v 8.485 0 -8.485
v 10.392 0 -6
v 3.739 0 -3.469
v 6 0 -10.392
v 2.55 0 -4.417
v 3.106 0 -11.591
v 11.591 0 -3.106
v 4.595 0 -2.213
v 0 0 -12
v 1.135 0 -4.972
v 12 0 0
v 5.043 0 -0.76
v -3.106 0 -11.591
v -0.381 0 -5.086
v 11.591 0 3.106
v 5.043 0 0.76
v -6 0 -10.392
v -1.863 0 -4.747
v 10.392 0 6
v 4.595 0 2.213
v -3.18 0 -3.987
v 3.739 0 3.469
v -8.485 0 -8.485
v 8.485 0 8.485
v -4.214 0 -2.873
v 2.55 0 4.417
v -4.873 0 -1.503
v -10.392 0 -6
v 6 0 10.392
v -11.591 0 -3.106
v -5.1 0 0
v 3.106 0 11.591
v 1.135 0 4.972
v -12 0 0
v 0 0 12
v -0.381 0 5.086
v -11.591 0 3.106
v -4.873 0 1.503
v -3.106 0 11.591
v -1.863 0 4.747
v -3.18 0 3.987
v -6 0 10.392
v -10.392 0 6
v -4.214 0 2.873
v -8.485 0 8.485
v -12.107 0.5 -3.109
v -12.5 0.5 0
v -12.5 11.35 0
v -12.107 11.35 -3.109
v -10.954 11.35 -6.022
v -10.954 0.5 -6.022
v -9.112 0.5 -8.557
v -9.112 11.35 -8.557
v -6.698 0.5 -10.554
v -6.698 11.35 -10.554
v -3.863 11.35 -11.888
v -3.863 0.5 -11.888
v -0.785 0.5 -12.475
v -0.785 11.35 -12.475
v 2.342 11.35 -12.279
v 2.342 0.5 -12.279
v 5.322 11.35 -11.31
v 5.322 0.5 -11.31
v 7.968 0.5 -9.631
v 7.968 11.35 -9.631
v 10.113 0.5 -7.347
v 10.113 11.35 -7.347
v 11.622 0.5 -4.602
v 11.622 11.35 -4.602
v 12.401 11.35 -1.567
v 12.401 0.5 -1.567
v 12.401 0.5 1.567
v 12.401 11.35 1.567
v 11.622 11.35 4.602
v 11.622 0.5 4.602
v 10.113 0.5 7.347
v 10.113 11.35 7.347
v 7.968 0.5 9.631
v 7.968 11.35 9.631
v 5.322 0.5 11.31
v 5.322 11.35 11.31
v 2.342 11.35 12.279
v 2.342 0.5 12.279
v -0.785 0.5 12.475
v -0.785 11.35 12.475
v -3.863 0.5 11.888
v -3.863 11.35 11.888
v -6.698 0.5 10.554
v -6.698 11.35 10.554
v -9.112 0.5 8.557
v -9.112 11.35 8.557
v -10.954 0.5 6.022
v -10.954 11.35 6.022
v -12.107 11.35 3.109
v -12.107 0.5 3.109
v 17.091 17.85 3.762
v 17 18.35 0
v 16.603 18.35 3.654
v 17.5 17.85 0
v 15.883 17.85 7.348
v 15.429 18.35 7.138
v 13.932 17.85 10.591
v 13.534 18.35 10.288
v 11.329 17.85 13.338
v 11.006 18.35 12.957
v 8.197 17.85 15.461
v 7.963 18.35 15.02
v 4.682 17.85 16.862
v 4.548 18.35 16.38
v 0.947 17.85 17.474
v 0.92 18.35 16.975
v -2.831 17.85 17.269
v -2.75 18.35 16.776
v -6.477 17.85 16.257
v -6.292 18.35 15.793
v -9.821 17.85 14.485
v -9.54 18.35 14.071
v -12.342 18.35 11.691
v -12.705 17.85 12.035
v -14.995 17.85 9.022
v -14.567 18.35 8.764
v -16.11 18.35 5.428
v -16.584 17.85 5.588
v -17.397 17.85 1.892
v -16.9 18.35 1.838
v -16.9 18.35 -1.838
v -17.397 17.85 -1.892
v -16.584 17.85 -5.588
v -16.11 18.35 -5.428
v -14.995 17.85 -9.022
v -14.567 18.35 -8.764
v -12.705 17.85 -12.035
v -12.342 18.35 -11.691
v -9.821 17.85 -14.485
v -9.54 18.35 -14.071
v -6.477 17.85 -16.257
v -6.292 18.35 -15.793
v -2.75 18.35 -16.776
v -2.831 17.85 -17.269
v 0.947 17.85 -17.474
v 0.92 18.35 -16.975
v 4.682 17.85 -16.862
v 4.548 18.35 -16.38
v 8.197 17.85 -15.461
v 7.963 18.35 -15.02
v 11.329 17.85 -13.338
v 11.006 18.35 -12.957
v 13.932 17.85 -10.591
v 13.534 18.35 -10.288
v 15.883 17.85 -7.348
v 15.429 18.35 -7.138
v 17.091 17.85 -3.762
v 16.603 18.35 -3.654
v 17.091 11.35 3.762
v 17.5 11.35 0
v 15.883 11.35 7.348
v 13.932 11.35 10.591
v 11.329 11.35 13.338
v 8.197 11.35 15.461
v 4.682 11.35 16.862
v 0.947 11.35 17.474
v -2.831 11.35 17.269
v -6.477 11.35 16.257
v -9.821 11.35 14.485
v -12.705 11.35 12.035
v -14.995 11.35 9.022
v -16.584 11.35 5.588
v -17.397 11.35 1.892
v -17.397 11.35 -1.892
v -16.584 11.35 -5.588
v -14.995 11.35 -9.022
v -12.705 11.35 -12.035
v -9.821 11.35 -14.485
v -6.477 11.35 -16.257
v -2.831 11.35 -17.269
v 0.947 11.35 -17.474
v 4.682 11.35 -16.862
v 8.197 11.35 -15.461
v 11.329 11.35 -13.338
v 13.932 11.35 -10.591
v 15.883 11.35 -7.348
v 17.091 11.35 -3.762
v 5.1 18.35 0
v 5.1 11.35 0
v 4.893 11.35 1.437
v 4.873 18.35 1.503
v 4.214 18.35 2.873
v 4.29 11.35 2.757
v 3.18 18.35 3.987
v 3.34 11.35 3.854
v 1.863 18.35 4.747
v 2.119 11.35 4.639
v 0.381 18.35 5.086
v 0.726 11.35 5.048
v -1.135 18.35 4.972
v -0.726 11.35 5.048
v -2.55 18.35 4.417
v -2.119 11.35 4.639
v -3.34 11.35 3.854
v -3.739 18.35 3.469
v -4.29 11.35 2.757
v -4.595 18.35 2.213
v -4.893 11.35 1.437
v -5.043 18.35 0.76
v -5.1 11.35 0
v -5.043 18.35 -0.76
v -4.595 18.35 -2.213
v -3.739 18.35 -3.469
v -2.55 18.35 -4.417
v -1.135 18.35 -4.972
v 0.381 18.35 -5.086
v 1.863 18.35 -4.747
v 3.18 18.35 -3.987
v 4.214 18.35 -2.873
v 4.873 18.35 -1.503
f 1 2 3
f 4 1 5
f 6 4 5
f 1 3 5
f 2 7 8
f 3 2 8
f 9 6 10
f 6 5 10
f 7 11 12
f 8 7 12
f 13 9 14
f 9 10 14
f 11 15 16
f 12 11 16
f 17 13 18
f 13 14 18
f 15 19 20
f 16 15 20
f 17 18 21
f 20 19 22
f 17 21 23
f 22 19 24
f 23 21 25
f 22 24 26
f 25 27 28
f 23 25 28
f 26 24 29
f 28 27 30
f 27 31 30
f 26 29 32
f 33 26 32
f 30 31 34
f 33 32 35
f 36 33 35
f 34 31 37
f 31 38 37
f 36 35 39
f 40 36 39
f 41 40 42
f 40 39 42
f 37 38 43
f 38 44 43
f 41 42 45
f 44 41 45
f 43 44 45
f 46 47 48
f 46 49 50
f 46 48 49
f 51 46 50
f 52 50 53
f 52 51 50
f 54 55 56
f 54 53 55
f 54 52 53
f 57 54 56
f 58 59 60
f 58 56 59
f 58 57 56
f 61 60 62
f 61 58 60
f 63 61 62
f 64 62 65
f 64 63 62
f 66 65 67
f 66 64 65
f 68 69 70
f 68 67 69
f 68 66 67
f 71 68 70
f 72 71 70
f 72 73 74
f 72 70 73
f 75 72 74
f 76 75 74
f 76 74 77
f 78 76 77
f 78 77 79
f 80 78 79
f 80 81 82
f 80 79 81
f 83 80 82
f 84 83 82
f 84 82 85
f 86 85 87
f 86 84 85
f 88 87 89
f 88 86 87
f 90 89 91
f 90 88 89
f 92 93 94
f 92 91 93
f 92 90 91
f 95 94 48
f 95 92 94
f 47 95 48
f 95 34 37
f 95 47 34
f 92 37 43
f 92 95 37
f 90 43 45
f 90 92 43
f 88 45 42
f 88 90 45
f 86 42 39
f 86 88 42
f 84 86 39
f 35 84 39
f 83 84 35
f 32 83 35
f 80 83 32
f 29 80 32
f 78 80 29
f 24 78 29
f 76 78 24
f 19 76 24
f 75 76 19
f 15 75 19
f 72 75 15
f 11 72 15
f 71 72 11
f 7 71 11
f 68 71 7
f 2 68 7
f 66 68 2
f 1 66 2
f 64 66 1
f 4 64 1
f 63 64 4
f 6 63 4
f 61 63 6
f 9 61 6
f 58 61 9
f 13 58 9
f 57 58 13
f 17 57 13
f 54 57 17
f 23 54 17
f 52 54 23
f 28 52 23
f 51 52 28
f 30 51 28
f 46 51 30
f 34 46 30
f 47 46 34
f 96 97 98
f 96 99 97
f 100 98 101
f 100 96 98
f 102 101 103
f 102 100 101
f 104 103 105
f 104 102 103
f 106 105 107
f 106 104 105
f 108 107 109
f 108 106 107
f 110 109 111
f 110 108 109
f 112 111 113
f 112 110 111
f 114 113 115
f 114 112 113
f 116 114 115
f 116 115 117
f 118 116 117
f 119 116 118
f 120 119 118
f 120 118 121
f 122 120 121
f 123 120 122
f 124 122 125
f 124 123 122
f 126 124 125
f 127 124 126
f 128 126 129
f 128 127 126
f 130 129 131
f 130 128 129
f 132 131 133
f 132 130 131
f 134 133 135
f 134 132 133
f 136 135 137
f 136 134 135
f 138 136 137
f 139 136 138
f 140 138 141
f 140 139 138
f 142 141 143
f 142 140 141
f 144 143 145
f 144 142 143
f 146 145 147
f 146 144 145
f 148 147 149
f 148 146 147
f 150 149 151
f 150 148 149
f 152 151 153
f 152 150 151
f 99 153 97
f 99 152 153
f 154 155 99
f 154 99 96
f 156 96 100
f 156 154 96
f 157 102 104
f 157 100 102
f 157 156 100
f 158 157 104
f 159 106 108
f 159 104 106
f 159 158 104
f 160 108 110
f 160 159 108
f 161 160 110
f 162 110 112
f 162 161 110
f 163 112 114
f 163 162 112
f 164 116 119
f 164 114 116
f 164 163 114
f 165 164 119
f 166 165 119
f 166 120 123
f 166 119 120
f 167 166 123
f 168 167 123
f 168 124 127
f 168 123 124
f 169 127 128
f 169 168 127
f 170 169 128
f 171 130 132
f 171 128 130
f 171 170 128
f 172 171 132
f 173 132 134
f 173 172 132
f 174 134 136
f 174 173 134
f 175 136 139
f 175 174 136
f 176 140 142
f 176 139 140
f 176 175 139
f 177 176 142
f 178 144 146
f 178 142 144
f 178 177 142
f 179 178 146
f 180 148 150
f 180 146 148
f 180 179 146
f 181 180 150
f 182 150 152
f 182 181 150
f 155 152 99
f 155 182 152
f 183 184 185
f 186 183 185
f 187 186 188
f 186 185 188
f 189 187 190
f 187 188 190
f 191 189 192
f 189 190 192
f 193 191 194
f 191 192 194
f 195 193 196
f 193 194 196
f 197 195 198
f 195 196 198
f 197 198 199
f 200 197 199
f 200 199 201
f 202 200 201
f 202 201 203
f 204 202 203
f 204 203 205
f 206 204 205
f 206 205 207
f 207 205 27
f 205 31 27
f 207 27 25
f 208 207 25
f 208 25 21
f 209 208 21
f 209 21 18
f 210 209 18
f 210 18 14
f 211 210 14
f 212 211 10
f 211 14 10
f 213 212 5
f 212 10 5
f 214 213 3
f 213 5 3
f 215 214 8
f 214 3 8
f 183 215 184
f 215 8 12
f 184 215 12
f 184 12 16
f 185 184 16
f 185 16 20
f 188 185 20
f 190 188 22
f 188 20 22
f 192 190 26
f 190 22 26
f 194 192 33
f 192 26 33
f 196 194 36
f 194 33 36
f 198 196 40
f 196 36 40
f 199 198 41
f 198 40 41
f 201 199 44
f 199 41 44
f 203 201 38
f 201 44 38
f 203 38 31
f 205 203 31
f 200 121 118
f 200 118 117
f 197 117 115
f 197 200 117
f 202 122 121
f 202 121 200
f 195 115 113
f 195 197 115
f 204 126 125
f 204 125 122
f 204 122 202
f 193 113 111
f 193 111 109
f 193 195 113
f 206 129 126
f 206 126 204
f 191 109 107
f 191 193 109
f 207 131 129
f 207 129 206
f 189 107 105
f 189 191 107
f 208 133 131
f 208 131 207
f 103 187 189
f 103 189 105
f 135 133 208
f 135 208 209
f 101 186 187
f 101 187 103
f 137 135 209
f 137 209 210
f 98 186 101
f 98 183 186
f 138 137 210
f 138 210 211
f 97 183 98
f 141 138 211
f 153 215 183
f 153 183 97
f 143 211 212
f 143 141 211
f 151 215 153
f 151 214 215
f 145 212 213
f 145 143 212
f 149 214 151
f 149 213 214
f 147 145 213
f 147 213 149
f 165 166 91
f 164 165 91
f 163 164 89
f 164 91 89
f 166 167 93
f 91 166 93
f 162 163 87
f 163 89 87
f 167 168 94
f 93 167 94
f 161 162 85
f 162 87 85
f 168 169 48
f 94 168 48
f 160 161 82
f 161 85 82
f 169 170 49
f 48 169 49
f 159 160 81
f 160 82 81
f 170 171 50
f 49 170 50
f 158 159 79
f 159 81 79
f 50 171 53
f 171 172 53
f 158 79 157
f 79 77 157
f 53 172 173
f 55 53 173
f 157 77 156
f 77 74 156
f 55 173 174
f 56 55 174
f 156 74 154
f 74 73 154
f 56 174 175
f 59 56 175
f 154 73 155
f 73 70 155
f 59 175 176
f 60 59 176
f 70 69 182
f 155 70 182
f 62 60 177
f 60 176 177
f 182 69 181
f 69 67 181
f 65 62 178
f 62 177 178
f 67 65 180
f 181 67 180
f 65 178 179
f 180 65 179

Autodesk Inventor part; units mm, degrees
ref_plane "YZ Plane" through (0, 0, 0) normal (1, 0, 0) x (0, 1, 0)
ref_plane "XZ Plane" through (0, 0, 0) normal (0, 1, 0) x (-1, 0, 0)
ref_plane "XY Plane" through (0, 0, 0) normal (0, 0, 1) x (1, 0, 0)
sketch "Sketch1" plane through (0, 0, 0) normal (0, 1, 0) x (-1, 0, 0)
  circle A0 centre (0, 0) radius 5.1
  circle A1 centre (0, 0) radius 12.5
  dimension "d0" = 10.2
  dimension "d1" = 25
extrude "Extrusion1" add sketch "Sketch1" along normal blind 11.35
sketch "Sketch2" plane through (0, 11.35, 0) normal (0, 1, 0) x (1, 0, 0)
  circle A0 centre (0, 0) radius 12.5 projected
  circle A1 centre (0, 0) radius 5.1 projected
  circle A2 centre (0, 0) radius 17.5
  dimension "d4" = 35
extrude "Extrusion2" add sketch "Sketch2" along normal blind 7 contours A0 | A2
chamfer "Chamfer1" distance 0.5 angle 45 1 edges at (12.5, 0, 0)
chamfer "Chamfer2" distance 0.5 angle 45 1 edges at (-17.5, 18.35, 0)
properties part number "Ydre_bøsning_stempel_stang"
